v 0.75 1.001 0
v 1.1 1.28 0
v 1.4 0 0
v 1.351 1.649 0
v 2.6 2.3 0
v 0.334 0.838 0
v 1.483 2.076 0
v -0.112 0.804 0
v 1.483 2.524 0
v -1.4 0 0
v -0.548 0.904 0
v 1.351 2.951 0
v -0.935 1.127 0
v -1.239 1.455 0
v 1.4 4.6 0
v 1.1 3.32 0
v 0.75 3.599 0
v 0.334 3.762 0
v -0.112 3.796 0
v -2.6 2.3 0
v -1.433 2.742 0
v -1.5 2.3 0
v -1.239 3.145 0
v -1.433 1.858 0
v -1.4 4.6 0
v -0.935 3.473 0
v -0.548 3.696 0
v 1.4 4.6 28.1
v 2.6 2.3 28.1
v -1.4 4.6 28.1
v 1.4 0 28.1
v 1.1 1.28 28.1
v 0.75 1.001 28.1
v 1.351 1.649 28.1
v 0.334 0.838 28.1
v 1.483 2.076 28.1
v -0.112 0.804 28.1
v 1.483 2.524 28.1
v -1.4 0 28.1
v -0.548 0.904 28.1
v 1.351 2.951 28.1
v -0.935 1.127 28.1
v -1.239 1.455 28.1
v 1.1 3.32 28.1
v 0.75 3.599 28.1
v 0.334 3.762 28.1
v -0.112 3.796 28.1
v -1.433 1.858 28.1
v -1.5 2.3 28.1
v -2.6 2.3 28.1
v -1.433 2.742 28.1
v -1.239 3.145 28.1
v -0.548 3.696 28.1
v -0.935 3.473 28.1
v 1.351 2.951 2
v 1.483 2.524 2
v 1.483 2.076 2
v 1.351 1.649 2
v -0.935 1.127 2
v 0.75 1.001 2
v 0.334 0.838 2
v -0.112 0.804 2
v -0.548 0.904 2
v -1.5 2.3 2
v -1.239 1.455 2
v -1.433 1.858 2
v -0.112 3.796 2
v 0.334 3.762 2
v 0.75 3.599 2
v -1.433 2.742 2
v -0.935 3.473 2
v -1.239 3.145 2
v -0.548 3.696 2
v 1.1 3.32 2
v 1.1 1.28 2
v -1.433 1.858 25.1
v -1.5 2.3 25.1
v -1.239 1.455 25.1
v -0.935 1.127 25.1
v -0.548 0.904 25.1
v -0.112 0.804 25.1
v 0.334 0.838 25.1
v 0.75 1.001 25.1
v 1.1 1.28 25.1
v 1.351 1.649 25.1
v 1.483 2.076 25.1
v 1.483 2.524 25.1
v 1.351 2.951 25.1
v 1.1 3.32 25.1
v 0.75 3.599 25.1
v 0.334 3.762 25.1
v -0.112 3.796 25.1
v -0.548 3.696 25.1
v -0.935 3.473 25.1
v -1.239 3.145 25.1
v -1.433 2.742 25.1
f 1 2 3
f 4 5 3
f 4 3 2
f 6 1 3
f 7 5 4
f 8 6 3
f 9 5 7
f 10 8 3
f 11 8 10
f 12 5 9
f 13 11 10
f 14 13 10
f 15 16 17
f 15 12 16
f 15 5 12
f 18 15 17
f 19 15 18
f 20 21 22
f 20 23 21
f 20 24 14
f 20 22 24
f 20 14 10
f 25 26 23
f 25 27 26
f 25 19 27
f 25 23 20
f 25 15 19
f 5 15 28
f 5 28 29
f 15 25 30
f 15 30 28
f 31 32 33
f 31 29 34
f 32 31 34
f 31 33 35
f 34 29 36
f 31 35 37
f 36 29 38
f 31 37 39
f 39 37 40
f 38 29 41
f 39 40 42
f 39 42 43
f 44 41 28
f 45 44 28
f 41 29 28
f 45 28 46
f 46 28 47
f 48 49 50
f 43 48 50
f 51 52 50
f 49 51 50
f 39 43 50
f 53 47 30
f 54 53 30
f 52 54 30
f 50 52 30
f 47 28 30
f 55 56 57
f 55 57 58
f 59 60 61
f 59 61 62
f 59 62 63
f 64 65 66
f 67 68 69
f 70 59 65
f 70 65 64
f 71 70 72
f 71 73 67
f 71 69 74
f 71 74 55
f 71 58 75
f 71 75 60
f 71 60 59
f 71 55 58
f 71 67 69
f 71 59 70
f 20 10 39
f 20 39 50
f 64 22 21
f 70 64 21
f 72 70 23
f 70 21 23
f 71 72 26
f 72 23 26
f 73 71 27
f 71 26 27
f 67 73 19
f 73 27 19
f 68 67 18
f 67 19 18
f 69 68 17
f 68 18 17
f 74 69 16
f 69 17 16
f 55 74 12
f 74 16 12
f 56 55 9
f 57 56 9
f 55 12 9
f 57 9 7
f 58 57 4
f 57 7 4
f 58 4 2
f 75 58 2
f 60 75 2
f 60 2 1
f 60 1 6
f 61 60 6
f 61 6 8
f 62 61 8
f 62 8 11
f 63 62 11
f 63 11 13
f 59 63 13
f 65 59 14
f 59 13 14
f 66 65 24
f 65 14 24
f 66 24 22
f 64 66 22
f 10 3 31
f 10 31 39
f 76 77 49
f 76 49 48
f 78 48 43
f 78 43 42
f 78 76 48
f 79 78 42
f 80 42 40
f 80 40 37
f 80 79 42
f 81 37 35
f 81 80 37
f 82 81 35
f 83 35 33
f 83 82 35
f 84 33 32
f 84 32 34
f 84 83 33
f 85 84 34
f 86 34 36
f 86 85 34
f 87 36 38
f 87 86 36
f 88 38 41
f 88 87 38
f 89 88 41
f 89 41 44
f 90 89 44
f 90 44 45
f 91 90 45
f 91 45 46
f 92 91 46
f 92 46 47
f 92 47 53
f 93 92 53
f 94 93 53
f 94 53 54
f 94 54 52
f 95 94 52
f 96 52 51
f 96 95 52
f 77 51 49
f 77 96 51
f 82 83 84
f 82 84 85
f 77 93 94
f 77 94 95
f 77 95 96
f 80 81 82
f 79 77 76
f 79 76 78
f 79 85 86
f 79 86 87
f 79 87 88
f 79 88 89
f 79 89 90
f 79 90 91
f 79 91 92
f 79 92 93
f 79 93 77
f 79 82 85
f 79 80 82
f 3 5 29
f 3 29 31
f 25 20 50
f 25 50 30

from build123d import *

# Parameters (mm, degrees)
BOSS_EXTRUDE1_DEPTH = 28.1
SKETCH2_R           = 1.5
CUT_EXTRUDE1_DEPTH  = 2
CUT_EXTRUDE2_START  = -3
SKETCH3_R           = 1.5
CUT_EXTRUDE2_DEPTH  = 3


with BuildPart() as part:
    # Sketch1 → Boss-Extrude1 (new body)
    with BuildSketch(Plane.XY):
        Polygon((-1.4, 4.6), (1.4, 4.6), (2.599787383, 2.3), (1.4, 0), (-1.4, 0), (-2.599787383, 2.3), align=None)
    extrude(amount=BOSS_EXTRUDE1_DEPTH)

    # Sketch2 → Cut-Extrude1 (cut)
    with BuildSketch(Plane(origin=(0, 0, 0), x_dir=(-1, 0, 0), z_dir=(0, 0, -1))):
        with Locations((0, 2.3)):
            Circle(SKETCH2_R)
    extrude(amount=-CUT_EXTRUDE1_DEPTH, mode=Mode.SUBTRACT)

    # Sketch3 → Cut-Extrude2 (cut)
    with BuildSketch(Plane.XY.offset(28.1).offset(CUT_EXTRUDE2_START)):
        with Locations(Location((0, 2.3, 0), (0, 0, 180))):
            Circle(SKETCH3_R)
    extrude(amount=CUT_EXTRUDE2_DEPTH, mode=Mode.SUBTRACT)


solid = part.part
